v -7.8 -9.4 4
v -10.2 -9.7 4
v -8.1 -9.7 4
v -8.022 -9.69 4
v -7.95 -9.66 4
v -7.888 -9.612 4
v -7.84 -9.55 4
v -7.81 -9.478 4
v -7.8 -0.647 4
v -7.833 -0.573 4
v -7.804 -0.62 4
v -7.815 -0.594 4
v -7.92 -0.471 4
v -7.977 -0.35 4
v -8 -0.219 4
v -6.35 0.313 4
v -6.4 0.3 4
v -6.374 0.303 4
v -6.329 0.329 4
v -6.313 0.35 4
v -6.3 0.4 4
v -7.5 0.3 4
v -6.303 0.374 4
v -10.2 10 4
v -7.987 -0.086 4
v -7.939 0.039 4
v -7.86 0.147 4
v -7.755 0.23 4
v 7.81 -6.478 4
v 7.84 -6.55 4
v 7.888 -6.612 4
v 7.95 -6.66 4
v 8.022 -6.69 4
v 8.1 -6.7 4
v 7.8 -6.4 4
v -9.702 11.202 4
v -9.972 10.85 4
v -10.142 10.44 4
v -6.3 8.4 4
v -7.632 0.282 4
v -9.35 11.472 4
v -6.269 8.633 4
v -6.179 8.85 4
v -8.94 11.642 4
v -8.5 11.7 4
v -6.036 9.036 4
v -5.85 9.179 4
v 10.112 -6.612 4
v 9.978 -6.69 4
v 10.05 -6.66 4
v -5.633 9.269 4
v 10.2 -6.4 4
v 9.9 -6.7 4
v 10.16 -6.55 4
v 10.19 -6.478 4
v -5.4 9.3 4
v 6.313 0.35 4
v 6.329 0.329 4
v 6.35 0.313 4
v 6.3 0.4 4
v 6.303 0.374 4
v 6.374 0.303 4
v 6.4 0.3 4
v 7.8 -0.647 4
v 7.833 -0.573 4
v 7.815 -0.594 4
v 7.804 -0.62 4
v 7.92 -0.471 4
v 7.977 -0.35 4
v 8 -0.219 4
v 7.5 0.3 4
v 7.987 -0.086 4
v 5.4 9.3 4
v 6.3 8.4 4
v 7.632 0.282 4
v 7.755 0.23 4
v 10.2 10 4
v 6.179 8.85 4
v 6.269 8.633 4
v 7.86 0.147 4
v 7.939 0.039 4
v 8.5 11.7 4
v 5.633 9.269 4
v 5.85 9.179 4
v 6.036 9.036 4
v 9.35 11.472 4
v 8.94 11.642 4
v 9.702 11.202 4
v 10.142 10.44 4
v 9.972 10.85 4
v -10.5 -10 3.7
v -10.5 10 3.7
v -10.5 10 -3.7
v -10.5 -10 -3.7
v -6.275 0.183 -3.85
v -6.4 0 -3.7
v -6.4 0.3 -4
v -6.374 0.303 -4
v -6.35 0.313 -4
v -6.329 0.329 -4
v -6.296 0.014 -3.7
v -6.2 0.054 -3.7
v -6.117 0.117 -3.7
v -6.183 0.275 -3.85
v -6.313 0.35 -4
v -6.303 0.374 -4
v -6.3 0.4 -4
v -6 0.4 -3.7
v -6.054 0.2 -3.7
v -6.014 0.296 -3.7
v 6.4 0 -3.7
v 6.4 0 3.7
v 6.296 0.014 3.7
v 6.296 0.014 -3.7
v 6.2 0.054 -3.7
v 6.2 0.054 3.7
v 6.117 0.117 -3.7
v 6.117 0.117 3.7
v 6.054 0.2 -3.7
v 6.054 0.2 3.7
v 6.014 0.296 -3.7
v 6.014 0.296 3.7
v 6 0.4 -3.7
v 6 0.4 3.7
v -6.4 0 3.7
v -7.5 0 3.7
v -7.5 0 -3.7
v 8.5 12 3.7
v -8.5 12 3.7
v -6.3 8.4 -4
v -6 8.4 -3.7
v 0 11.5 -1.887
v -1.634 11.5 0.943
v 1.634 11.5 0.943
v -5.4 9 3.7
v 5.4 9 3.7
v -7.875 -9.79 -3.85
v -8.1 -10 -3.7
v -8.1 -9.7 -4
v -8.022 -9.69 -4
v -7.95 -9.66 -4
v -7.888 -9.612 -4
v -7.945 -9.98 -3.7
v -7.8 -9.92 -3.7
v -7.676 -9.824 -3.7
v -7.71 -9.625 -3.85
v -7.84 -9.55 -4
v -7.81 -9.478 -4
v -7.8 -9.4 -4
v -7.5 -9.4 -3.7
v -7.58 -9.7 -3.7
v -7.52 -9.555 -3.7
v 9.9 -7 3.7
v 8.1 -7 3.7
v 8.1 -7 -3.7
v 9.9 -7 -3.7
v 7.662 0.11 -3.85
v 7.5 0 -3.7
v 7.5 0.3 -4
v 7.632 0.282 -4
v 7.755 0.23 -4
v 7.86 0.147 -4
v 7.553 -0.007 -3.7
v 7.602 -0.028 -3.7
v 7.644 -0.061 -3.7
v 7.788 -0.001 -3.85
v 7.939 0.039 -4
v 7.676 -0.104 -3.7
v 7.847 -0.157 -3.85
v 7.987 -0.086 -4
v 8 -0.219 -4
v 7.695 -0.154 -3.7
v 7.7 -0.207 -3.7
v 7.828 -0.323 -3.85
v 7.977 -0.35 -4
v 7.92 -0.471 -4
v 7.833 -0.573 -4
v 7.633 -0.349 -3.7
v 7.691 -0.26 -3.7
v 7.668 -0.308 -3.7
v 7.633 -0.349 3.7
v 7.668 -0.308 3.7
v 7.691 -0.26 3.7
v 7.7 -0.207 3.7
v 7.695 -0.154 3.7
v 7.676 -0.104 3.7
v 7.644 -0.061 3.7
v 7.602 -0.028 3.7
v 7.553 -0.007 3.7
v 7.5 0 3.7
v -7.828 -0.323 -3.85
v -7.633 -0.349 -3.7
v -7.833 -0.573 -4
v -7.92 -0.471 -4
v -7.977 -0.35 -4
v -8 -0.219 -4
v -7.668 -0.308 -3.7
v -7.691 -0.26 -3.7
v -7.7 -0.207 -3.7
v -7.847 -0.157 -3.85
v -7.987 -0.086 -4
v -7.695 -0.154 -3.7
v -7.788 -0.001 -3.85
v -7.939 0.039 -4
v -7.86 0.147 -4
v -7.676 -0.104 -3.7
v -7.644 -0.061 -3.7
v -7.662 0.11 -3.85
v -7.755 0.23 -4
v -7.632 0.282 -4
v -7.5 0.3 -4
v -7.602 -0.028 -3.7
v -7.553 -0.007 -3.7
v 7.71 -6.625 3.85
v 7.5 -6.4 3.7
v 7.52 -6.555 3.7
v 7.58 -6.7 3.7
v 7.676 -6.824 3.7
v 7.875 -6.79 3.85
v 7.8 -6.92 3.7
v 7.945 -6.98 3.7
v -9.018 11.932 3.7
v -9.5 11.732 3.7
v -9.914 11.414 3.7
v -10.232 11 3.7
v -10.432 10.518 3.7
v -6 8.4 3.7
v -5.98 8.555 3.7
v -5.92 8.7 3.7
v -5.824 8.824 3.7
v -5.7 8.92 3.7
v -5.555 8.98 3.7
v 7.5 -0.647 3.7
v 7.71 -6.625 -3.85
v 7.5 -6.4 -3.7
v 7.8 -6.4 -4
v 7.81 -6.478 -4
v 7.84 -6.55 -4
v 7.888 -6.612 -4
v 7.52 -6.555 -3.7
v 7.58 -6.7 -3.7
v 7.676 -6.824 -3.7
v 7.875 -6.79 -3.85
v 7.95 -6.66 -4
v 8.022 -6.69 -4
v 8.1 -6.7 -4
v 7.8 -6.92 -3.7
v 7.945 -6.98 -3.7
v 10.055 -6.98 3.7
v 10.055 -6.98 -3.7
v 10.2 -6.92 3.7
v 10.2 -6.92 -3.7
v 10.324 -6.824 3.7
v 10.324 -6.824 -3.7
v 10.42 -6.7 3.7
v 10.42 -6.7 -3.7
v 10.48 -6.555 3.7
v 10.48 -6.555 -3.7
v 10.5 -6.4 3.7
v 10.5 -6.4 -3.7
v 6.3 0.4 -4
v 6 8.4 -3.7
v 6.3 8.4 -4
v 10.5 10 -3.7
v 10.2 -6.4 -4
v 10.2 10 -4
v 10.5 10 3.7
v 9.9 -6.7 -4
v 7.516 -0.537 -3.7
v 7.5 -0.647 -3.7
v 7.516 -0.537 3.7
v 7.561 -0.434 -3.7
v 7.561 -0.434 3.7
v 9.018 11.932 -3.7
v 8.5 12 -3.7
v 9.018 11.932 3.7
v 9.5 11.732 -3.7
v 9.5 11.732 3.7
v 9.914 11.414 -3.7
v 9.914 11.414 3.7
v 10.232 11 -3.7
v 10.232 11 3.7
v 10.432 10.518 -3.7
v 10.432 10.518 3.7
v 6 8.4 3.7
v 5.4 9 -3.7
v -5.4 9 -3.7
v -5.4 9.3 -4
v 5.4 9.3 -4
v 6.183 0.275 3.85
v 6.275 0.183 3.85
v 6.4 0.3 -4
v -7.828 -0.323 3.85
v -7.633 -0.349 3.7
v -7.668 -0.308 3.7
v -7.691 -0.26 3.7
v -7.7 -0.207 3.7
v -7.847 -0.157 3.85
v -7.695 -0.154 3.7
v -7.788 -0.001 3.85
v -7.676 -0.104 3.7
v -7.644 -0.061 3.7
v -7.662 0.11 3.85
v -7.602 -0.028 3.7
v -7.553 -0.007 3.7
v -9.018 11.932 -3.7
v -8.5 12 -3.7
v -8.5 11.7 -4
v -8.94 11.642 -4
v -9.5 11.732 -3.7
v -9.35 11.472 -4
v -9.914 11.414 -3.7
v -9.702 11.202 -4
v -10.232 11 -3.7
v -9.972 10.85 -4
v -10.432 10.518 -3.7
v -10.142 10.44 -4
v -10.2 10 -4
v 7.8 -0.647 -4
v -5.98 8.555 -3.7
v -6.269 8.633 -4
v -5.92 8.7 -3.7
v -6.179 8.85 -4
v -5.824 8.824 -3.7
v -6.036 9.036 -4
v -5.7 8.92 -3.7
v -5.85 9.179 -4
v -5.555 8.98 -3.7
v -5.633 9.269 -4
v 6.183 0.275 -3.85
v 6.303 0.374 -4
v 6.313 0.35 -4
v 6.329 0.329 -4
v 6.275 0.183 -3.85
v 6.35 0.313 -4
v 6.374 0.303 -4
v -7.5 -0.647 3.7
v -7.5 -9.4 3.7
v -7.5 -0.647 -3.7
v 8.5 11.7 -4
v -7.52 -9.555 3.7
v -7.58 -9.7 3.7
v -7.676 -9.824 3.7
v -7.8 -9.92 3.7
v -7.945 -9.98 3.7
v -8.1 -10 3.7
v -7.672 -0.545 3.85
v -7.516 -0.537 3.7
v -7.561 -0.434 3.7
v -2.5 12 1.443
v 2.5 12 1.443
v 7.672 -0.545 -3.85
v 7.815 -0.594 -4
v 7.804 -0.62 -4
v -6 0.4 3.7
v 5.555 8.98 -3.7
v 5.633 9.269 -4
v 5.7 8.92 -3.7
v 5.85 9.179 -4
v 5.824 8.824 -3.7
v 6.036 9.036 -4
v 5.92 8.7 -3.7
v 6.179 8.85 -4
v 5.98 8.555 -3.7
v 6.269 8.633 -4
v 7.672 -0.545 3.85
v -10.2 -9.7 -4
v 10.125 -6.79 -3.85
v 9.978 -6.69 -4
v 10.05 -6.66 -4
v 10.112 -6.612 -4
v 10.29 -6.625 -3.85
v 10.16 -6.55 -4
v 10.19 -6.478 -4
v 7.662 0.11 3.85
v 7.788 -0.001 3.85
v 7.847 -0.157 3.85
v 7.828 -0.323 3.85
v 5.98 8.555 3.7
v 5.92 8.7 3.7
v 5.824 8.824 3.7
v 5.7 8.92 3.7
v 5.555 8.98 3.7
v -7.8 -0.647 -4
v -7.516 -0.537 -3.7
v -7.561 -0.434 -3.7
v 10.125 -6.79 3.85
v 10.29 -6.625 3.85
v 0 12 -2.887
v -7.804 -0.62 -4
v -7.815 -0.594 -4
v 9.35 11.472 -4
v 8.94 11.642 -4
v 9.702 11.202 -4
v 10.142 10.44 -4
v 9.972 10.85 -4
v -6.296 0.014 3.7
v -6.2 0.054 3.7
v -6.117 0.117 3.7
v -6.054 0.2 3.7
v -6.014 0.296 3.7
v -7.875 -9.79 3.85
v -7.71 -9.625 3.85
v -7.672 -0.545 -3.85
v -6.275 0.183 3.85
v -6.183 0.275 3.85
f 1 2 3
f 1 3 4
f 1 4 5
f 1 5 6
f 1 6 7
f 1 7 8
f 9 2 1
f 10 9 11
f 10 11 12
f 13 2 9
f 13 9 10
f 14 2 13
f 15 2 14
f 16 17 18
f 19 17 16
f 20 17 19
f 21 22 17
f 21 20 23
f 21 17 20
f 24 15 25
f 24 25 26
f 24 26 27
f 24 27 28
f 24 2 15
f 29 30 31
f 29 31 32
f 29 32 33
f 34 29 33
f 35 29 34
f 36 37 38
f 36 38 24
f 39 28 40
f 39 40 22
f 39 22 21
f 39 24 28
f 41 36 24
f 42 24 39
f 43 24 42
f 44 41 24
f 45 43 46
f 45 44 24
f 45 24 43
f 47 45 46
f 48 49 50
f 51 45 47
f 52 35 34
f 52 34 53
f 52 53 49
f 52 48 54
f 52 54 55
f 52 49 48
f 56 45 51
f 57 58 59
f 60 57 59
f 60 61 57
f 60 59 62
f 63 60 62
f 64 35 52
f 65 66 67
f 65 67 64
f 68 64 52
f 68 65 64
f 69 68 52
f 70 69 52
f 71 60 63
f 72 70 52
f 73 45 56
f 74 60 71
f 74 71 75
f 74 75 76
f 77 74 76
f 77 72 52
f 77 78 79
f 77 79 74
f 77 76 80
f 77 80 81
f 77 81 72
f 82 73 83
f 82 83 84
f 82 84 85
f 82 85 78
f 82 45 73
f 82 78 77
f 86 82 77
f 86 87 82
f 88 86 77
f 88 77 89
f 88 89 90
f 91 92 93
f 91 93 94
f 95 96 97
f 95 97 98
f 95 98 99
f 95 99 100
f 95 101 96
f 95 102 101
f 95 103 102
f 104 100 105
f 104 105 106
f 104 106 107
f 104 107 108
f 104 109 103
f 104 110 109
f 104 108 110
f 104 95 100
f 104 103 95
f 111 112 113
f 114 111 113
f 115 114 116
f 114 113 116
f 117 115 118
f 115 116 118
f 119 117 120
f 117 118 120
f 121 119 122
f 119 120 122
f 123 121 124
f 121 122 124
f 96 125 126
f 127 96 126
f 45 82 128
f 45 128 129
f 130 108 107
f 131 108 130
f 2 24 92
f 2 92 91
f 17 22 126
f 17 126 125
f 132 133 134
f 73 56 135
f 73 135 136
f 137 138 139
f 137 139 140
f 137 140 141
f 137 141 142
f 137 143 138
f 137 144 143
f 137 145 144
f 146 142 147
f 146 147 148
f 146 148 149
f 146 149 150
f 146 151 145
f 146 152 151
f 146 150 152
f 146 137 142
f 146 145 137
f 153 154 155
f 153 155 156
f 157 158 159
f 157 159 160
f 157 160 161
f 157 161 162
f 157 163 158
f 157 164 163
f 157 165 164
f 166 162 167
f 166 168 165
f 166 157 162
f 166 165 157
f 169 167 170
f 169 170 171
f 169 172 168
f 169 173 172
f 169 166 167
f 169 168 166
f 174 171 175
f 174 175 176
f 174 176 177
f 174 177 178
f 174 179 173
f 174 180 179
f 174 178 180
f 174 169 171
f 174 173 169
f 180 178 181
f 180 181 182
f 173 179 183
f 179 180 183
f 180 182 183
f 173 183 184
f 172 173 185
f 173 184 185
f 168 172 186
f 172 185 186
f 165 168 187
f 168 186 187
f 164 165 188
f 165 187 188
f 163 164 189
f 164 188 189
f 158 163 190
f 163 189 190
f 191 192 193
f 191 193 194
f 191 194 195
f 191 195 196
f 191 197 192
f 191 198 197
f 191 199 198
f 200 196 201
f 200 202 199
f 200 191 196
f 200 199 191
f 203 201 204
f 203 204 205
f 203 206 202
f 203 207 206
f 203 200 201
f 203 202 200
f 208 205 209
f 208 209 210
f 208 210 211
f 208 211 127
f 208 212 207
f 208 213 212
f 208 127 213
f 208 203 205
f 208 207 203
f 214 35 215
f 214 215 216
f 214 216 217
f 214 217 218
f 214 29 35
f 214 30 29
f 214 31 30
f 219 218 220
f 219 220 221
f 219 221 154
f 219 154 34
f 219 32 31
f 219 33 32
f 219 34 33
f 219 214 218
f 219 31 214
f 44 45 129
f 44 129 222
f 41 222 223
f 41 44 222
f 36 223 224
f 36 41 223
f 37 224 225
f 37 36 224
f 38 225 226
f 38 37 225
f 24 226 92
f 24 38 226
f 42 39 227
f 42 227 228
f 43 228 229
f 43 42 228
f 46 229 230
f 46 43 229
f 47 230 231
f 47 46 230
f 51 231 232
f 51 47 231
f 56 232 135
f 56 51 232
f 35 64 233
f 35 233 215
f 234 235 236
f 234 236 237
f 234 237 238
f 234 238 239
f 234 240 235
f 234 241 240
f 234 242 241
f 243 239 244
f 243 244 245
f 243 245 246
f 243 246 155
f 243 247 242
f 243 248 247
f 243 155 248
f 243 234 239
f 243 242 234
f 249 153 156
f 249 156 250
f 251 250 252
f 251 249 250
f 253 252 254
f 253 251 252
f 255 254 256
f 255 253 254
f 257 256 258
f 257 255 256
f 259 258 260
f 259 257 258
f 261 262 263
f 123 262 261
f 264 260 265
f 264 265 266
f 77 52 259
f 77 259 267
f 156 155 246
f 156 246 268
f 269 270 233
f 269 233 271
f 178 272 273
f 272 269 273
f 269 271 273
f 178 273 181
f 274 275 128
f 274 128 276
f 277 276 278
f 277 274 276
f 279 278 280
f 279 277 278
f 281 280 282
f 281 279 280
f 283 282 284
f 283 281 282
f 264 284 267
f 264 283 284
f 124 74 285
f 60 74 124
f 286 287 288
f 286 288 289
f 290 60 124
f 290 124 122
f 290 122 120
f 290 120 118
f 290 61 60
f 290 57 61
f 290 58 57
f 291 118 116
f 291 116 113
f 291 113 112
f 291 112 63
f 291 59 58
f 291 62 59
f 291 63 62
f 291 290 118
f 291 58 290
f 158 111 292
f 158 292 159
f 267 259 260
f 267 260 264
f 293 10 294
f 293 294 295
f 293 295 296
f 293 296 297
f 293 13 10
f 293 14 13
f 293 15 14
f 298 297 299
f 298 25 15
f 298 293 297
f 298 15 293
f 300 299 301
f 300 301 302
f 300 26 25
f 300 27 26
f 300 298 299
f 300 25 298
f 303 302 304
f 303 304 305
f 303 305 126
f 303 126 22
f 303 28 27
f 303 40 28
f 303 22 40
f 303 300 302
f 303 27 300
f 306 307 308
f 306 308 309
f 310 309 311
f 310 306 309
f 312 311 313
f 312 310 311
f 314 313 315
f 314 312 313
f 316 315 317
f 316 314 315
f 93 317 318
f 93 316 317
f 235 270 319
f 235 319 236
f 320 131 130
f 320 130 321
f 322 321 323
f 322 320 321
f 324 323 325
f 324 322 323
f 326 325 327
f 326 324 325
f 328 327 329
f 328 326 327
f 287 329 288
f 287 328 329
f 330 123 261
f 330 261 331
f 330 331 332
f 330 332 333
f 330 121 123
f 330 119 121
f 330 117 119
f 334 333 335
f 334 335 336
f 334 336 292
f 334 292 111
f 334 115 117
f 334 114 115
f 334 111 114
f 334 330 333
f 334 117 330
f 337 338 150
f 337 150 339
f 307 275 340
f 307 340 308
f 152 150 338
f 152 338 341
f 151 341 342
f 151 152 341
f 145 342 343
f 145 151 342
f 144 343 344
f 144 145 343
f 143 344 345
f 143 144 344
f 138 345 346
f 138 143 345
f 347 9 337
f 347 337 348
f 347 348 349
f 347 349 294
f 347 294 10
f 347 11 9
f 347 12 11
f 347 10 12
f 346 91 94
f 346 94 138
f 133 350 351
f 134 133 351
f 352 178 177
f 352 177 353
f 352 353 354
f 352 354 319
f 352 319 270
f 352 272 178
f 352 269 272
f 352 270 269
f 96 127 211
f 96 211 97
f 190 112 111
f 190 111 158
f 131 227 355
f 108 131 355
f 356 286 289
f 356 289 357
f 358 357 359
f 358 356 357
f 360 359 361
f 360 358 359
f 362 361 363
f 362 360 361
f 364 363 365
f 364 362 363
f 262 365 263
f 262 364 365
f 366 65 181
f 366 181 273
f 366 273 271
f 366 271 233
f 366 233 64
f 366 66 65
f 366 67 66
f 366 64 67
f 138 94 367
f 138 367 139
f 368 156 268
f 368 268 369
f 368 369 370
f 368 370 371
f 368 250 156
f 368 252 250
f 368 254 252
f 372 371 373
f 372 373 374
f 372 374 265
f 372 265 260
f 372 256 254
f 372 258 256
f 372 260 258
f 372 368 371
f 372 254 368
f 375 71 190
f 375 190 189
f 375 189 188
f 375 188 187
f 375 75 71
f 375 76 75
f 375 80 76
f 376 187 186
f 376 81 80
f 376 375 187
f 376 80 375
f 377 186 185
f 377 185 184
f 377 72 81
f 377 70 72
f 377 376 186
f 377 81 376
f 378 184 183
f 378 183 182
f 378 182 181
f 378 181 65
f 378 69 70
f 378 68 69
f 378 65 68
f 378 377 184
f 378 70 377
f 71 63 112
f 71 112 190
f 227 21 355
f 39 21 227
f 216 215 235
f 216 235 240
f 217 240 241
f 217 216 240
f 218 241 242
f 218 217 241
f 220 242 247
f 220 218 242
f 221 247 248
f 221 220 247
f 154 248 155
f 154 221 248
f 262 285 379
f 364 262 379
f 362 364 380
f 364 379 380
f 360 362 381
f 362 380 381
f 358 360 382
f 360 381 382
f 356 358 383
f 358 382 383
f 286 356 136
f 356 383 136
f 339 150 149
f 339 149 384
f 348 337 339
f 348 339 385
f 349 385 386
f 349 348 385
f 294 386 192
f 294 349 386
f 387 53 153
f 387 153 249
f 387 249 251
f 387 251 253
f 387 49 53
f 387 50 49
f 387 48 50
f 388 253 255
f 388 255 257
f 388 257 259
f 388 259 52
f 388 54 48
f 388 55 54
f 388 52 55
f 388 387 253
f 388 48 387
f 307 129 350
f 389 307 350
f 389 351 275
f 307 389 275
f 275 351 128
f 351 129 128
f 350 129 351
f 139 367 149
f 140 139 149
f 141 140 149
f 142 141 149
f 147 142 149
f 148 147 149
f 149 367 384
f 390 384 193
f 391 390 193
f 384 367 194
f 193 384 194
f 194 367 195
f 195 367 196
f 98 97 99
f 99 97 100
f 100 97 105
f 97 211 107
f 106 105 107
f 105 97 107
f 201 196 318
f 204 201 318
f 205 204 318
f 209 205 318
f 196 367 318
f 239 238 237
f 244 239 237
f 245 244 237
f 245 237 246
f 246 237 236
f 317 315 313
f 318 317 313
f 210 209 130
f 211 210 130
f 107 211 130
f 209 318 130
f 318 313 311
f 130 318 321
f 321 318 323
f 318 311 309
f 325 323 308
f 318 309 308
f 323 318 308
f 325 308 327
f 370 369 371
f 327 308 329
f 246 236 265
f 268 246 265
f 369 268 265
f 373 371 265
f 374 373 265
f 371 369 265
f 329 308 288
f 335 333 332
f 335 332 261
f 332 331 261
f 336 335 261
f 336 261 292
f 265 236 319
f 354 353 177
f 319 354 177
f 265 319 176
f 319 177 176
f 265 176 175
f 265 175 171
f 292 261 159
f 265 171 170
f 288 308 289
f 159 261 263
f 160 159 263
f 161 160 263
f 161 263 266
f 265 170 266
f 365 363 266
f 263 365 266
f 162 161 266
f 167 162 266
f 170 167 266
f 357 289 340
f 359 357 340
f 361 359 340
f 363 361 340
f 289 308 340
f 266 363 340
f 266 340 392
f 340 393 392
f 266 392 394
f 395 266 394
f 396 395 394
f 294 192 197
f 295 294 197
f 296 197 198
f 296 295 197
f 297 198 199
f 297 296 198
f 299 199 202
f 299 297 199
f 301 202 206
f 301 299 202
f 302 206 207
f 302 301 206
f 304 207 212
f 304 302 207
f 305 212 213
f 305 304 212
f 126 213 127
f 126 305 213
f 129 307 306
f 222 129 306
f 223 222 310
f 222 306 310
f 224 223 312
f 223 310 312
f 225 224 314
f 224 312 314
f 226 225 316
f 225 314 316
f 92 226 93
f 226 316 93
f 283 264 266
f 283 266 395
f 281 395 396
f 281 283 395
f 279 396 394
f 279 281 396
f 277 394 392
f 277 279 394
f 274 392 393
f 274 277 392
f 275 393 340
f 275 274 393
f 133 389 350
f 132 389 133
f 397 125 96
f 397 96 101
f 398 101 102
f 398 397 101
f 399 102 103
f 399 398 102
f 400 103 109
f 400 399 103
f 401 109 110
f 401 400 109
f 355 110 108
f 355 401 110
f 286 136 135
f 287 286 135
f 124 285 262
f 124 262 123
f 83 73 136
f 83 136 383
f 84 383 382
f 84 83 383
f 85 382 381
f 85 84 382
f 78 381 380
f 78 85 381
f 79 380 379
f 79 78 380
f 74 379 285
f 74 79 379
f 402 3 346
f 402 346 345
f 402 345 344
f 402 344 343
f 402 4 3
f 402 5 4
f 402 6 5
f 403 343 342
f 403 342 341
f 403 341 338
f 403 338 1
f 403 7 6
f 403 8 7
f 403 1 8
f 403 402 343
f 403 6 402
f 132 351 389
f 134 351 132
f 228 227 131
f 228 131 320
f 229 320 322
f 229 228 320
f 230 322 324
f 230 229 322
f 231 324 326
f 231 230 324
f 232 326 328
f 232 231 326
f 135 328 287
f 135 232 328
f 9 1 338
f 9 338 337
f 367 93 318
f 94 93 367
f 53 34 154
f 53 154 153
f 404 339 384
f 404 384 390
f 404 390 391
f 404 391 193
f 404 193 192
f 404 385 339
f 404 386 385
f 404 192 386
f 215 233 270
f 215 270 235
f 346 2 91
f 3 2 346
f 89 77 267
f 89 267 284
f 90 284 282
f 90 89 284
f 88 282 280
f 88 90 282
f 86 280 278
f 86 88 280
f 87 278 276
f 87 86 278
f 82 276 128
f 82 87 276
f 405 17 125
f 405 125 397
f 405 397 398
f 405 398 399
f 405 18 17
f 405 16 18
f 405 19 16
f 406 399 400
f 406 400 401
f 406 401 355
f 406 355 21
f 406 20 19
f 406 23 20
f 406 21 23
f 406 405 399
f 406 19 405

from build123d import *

# Parameters (mm, degrees)
BOSS_EXTRUDE1_DEPTH = 4
SKETCH2_R           = 0.2
CUT_EXTRUDE1_DEPTH  = 8
FILLET2_R           = 0.4
FILLET1_R           = 0.6
FILLET3_R           = 2
BOSS_EXTRUDE2_DEPTH = 8
FILLET4_R           = 0.6
CUT_EXTRUDE2_DEPTH  = 0.5
CUT_EXTRUDE2_DRAFT  = -45
CHAMFER1_SIZE       = 0.3


with BuildPart() as part:
    # Sketch1 → Boss-Extrude1 (new, symmetric)
    with BuildSketch(Plane.XY):
        Polygon((0, 9), (6, 9), (6, 0), (7.5, 0), (7.5, -7), (10.5, -7), (10.5, 12), (0, 12), align=None)
    extrude(amount=BOSS_EXTRUDE1_DEPTH, both=True)

    # Sketch2 → Cut-Extrude1 (cut)
    with BuildSketch(Plane.XY.offset(4)):
        with Locations((7.5, -0.2)):
            Circle(SKETCH2_R)
    extrude(amount=-CUT_EXTRUDE1_DEPTH, mode=Mode.SUBTRACT)

    # Fillet2
    fillet2_edges = [part.edges().sort_by_distance(p)[0] for p in [
        (6, 0, 0),
        (7.5, -0.4, 0),
    ]]
    fillet(fillet2_edges, radius=FILLET2_R)

    # Fillet1
    fillet1_edges = [part.edges().sort_by_distance(p)[0] for p in [
        (10.5, -7, 0),
        (7.5, -7, 0),
        (6, 9, 0),
    ]]
    fillet(fillet1_edges, radius=FILLET1_R)

    # Fillet3
    fillet3_edges = [part.edges().sort_by_distance(p)[0] for p in [
        (10.5, 12, 0),
    ]]
    fillet(fillet3_edges, radius=FILLET3_R)

    # Mirror1: part across plane


with BuildPart() as part_1:
    add(part.part)
    add(part.part.mirror(Plane(origin=(0, 12, 4), x_dir=(0, 0, 1), z_dir=(1, 0, 0))))

    # Sketch3 → Boss-Extrude2 (add)
    with BuildSketch(Plane.XY.offset(4)):
        with BuildLine():
            Line((-8.1, -7), (-9.9, -7))
            ThreePointArc((-9.9, -7), (-10.324264069, -6.824264069), (-10.5, -6.4))
            Line((-10.5, -6.4), (-10.5, -10))
            Line((-10.5, -10), (-7.5, -10))
            Line((-7.5, -10), (-7.5, -6.4))
            ThreePointArc((-7.5, -6.4), (-7.675735931, -6.824264069), (-8.1, -7))
        make_face()
    extrude(amount=-BOSS_EXTRUDE2_DEPTH)

    # Fillet4
    fillet4_edges = [part_1.edges().sort_by_distance(p)[0] for p in [
        (-7.5, -10, 0),
    ]]
    fillet(fillet4_edges, radius=FILLET4_R)


with BuildPart() as cut_extrude2_tool:
    # Sketch4 → Cut-Extrude2 (with draft: the straight prism first)
    with BuildSketch(Plane(origin=(0, 12, 0), x_dir=(1, 0, 0), z_dir=(0, 1, 0))):
        Polygon((-2.5, -1.443375673), (2.5, -1.443375673), (0, 2.886751346), align=None)
    extrude(amount=-CUT_EXTRUDE2_DEPTH)
    # Cut-Extrude2: the draft: its side faces are tilted about the plane it starts from
    cut_extrude2_sides = [cut_extrude2_tool.faces().sort_by_distance(p)[0] for p in [
        (0, 11.75, 1.443375673),
        (1.25, 11.75, -0.721687836),
        (-1.25, 11.75, -0.721687836),
    ]]
    draft(cut_extrude2_sides, Plane(origin=(0, 12, 0), x_dir=(1, 0, 0), z_dir=(0, 1, 0)), CUT_EXTRUDE2_DRAFT)


with BuildPart() as part_2:
    add(part_1.part)

    # Cut-Extrude2: cut by cut_extrude2_tool
    add(cut_extrude2_tool.part, mode=Mode.SUBTRACT)

    # Chamfer1
    chamfer1_edges = [part_2.edges().sort_by_distance(p)[0] for p in [
        (-9.3, -10, 4),
        (0, 9, -4),
        (-9.3, -10, -4),
        (-7.675735931, -9.824264069, 4),
        (-7.675735931, -9.824264069, -4),
        (6.95, 0, -4),
        (6.95, 0, 4),
        (7.5, -3.523606798, -4),
        (7.686834472, -0.128635582, -4),
        (7.534851628, -0.483914279, -4),
        (6.117157288, 0.117157288, -4),
        (7.686834472, -0.128635582, 4),
        (7.5, -3.523606798, 4),
        (7.534851628, -0.483914279, 4),
        (6.117157288, 0.117157288, 4),
        (10.5, 1.8, -4),
        (10.5, 1.8, 4),
        (6, 4.4, -4),
        (9, -7, -4),
        (7.675735931, -6.824264069, -4),
        (10.324264069, -6.824264069, -4),
        (9, -7, 4),
        (6, 4.4, 4),
        (7.675735931, -6.824264069, 4),
        (10.324264069, -6.824264069, 4),
        (5.824264069, 8.824264069, -4),
        (5.824264069, 8.824264069, 4),
        (0, 12, -4),
        (0, 12, 4),
        (9.914213562, 11.414213562, -4),
        (9.914213562, 11.414213562, 4),
        (-6, 4.4, 4),
        (-6.95, 0, 4),
        (-7.5, -5.023606798, 4),
        (-10.5, 0, 4),
        (-7.686834472, -0.128635582, 4),
        (-6, 4.4, -4),
        (-6.95, 0, -4),
        (-7.5, -5.023606798, -4),
        (-10.5, 0, -4),
        (-7.686834472, -0.128635582, -4),
        (-6.117157288, 0.117157288, 4),
        (-6.117157288, 0.117157288, -4),
        (-7.534851628, -0.483914279, 4),
        (-7.534851628, -0.483914279, -4),
        (-5.824264069, 8.824264069, 4),
        (-5.824264069, 8.824264069, -4),
        (-9.914213562, 11.414213562, 4),
        (-9.914213562, 11.414213562, -4),
        (0, 9, 4),
    ]]
    chamfer(chamfer1_edges, length=CHAMFER1_SIZE)


solid = part_2.part
